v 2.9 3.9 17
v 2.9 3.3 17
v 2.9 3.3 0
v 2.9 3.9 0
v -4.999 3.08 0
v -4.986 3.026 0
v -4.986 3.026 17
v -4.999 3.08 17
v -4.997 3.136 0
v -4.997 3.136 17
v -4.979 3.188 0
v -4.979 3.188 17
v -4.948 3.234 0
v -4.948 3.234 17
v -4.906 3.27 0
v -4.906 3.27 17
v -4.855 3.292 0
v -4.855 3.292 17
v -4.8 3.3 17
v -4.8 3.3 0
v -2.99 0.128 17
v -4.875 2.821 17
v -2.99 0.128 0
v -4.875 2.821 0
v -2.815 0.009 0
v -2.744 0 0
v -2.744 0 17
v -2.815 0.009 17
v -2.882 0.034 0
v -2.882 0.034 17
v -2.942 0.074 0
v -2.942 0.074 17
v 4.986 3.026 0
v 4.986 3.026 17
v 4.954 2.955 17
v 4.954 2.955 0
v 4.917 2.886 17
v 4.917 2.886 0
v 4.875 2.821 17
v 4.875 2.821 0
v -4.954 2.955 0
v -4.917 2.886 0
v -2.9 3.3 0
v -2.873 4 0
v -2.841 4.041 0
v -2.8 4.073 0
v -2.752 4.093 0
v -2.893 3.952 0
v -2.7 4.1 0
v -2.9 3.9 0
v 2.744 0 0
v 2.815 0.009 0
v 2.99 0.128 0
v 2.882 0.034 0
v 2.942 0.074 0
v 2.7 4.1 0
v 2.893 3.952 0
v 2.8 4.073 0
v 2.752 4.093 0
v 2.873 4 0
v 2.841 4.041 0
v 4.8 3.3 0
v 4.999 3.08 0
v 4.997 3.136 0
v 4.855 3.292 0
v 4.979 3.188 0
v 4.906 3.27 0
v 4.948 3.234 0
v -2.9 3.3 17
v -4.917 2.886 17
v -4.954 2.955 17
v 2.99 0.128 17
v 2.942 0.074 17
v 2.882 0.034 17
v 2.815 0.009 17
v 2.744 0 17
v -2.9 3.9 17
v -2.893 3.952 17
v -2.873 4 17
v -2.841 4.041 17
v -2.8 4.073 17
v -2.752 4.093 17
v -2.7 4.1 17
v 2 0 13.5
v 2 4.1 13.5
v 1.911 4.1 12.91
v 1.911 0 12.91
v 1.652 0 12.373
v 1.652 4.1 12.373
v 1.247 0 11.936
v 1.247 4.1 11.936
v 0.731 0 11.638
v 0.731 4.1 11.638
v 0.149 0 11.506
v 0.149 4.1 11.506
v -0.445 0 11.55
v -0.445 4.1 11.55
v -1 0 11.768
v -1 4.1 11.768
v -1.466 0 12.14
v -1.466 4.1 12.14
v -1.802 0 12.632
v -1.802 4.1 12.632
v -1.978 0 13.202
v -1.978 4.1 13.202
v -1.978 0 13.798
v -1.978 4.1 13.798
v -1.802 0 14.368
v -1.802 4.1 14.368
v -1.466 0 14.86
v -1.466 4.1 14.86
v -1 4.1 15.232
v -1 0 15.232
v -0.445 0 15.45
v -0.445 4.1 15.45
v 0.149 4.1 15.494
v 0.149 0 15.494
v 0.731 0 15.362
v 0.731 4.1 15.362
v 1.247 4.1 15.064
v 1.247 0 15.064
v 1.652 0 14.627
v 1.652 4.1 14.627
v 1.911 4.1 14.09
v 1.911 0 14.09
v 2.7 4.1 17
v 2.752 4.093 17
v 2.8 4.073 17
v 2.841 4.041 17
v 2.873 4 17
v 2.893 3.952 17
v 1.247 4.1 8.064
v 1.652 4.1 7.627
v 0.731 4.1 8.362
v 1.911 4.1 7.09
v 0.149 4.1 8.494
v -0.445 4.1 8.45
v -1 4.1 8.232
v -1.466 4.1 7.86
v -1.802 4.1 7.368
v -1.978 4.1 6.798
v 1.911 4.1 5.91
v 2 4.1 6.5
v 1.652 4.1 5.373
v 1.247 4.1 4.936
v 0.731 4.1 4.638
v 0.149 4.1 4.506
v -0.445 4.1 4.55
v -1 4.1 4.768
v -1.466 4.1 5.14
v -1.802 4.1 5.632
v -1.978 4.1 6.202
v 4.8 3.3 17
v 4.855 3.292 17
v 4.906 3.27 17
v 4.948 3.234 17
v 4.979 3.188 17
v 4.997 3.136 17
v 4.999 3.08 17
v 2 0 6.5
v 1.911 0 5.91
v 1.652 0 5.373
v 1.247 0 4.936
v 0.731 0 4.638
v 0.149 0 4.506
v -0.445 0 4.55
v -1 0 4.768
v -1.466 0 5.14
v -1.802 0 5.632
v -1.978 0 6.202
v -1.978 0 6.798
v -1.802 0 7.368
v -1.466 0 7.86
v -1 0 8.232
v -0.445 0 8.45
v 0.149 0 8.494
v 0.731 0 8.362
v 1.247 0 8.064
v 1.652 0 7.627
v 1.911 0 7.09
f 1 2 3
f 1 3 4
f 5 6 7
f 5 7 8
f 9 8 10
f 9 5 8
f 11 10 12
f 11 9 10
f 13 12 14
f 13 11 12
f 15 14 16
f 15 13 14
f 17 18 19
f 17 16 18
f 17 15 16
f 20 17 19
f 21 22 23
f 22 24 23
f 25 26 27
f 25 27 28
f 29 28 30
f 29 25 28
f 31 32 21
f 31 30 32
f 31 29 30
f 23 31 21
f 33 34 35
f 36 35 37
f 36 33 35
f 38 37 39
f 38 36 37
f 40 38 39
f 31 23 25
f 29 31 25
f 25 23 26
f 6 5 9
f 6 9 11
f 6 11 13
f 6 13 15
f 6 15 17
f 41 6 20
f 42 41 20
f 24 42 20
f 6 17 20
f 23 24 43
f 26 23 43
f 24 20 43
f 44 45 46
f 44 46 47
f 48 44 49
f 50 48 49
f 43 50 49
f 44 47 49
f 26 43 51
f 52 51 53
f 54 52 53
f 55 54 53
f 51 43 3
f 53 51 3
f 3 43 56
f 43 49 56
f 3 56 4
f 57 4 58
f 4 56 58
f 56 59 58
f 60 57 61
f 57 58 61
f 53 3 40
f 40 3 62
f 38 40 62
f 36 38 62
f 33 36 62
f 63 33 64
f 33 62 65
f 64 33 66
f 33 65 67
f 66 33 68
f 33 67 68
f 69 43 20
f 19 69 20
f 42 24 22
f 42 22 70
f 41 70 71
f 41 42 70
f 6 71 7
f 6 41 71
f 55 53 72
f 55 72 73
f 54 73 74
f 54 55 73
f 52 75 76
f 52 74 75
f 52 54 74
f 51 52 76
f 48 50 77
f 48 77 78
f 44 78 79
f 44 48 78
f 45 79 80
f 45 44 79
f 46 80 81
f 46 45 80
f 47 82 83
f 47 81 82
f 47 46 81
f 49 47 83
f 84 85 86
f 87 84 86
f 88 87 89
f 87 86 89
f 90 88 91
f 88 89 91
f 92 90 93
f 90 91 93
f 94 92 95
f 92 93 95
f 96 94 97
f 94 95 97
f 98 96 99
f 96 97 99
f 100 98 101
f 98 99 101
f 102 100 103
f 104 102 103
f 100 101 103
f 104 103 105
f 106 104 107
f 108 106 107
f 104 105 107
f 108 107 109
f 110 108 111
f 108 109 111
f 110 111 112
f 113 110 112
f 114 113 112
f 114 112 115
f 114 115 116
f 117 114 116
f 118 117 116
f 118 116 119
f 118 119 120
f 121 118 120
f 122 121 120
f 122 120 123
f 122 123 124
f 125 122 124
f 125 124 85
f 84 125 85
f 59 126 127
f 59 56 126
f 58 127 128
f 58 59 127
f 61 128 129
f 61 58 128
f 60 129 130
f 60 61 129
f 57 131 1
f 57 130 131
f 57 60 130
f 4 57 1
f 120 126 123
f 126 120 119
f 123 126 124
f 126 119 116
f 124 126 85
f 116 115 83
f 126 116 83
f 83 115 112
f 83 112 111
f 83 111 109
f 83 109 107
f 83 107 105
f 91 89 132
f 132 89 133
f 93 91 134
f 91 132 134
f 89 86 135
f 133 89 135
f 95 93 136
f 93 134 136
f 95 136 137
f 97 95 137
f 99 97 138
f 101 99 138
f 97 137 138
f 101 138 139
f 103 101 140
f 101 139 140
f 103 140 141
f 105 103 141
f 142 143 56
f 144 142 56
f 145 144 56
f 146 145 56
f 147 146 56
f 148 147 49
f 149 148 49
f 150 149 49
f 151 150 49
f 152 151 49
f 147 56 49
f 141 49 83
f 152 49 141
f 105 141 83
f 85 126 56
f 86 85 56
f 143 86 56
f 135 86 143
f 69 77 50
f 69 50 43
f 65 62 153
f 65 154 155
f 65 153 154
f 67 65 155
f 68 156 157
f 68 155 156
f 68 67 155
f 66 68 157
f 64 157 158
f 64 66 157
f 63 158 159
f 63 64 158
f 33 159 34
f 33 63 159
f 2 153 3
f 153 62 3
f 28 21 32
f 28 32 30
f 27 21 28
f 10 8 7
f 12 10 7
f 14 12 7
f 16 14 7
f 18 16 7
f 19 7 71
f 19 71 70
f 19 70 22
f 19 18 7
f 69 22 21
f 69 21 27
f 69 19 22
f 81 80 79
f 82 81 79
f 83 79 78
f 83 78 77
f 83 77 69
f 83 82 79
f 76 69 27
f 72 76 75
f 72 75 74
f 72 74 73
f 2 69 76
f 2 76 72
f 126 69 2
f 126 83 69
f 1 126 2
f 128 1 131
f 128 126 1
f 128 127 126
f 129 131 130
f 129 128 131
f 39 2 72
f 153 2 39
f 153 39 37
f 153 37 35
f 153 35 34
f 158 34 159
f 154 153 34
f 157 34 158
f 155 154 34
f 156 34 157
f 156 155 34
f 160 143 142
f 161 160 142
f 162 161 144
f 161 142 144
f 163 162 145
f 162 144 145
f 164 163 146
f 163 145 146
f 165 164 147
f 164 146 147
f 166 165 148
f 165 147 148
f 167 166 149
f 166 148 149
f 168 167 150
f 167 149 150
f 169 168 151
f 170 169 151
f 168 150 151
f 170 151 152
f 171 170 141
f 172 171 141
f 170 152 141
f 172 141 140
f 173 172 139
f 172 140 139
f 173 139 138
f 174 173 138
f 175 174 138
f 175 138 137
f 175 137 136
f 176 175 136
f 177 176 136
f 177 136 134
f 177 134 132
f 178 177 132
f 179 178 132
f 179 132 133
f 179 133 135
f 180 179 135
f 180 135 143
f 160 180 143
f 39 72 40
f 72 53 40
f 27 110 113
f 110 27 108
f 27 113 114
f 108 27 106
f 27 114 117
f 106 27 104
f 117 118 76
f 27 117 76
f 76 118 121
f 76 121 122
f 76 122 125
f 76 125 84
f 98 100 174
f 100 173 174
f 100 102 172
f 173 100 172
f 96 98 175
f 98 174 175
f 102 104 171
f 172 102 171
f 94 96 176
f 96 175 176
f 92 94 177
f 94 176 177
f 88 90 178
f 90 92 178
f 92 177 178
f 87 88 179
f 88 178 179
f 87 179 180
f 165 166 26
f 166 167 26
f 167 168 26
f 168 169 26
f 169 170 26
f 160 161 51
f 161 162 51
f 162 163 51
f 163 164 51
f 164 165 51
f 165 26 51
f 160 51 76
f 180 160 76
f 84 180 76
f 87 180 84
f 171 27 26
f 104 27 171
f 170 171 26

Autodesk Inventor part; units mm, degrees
ref_plane "YZ Plane" through (0, 0, 0) normal (1, 0, 0) x (0, 1, 0)
ref_plane "XZ Plane" through (0, 0, 0) normal (0, 1, 0) x (-1, 0, 0)
ref_plane "XY Plane" through (0, 0, 0) normal (0, 0, 1) x (1, 0, 0)
sketch "Sketch_1" plane through (0, 0, 0) normal (0, 0, 1) x (1, 0, 0)
  arc A0 (-4.7999, 3.3) -> (-4.9858, 3.0264) centre (-4.7999, 3.1) ccw
  arc A1 (-4.9858, 3.0264) -> (-4.8752, 2.8208) centre (-4.056, 3.3944) ccw
  line L0 (-4.8752, 2.8208) -> (-2.9896, 0.1279)
  arc A2 (-2.9896, 0.1279) -> (-2.7438, 0) centre (-2.7438, 0.3) ccw
  line L1 (-2.7438, 0) -> (2.7438, 0)
  arc A3 (2.7438, 0) -> (2.9896, 0.1279) centre (2.7438, 0.3) ccw
  line L2 (2.9896, 0.1279) -> (4.8752, 2.8208)
  arc A4 (4.8752, 2.8208) -> (4.9858, 3.0264) centre (4.056, 3.3944) ccw
  arc A5 (4.9858, 3.0264) -> (4.7999, 3.3) centre (4.7999, 3.1) ccw
  line L3 (4.7999, 3.3) -> (2.9, 3.3)
  line L4 (2.9, 3.3) -> (2.9, 3.9)
  arc A6 (2.9, 3.9) -> (2.7, 4.1) centre (2.7, 3.9) ccw
  line L5 (2.7, 4.1) -> (-2.7, 4.1)
  arc A7 (-2.7, 4.1) -> (-2.9, 3.9) centre (-2.7, 3.9) ccw
  line L6 (-2.9, 3.9) -> (-2.9, 3.3)
  line L7 (-2.9, 3.3) -> (-4.7999, 3.3)
extrude "Extrusion1" add sketch "Sketch_1" along normal blind 17
sketch "Sketch3" plane through (-2.7, 4.1, 0) normal (0, 1, 0) x (1, 0, 0)
  line L0 (0, -17) -> (5.4, -17) projected
  line L1 (5.4, 0) -> (5.4, -17) projected
  line L2 (5.4, 0) -> (0, 0) projected
  circle A0 centre (2.7, -6.5) radius 2
  circle A1 centre (2.7, -13.5) radius 2
  point P0 (2.7, 0)
  dimension "d5" = 4
  dimension "d6" = 6.5
  dimension "d7" = 2.7
  dimension "d8" = 3.5
  dimension "d9" = 4
extrude "Extrusion2" cut sketch "Sketch3" against normal up to next
thread "Thread2" size "M4x0.7" class "6H" standard "ANSI Metric M Profile" full length
thread "Thread3" size "M4x0.7" class "6H" standard "ANSI Metric M Profile" full length
properties part number "ExtrusionNutLockHNTR5-4"
